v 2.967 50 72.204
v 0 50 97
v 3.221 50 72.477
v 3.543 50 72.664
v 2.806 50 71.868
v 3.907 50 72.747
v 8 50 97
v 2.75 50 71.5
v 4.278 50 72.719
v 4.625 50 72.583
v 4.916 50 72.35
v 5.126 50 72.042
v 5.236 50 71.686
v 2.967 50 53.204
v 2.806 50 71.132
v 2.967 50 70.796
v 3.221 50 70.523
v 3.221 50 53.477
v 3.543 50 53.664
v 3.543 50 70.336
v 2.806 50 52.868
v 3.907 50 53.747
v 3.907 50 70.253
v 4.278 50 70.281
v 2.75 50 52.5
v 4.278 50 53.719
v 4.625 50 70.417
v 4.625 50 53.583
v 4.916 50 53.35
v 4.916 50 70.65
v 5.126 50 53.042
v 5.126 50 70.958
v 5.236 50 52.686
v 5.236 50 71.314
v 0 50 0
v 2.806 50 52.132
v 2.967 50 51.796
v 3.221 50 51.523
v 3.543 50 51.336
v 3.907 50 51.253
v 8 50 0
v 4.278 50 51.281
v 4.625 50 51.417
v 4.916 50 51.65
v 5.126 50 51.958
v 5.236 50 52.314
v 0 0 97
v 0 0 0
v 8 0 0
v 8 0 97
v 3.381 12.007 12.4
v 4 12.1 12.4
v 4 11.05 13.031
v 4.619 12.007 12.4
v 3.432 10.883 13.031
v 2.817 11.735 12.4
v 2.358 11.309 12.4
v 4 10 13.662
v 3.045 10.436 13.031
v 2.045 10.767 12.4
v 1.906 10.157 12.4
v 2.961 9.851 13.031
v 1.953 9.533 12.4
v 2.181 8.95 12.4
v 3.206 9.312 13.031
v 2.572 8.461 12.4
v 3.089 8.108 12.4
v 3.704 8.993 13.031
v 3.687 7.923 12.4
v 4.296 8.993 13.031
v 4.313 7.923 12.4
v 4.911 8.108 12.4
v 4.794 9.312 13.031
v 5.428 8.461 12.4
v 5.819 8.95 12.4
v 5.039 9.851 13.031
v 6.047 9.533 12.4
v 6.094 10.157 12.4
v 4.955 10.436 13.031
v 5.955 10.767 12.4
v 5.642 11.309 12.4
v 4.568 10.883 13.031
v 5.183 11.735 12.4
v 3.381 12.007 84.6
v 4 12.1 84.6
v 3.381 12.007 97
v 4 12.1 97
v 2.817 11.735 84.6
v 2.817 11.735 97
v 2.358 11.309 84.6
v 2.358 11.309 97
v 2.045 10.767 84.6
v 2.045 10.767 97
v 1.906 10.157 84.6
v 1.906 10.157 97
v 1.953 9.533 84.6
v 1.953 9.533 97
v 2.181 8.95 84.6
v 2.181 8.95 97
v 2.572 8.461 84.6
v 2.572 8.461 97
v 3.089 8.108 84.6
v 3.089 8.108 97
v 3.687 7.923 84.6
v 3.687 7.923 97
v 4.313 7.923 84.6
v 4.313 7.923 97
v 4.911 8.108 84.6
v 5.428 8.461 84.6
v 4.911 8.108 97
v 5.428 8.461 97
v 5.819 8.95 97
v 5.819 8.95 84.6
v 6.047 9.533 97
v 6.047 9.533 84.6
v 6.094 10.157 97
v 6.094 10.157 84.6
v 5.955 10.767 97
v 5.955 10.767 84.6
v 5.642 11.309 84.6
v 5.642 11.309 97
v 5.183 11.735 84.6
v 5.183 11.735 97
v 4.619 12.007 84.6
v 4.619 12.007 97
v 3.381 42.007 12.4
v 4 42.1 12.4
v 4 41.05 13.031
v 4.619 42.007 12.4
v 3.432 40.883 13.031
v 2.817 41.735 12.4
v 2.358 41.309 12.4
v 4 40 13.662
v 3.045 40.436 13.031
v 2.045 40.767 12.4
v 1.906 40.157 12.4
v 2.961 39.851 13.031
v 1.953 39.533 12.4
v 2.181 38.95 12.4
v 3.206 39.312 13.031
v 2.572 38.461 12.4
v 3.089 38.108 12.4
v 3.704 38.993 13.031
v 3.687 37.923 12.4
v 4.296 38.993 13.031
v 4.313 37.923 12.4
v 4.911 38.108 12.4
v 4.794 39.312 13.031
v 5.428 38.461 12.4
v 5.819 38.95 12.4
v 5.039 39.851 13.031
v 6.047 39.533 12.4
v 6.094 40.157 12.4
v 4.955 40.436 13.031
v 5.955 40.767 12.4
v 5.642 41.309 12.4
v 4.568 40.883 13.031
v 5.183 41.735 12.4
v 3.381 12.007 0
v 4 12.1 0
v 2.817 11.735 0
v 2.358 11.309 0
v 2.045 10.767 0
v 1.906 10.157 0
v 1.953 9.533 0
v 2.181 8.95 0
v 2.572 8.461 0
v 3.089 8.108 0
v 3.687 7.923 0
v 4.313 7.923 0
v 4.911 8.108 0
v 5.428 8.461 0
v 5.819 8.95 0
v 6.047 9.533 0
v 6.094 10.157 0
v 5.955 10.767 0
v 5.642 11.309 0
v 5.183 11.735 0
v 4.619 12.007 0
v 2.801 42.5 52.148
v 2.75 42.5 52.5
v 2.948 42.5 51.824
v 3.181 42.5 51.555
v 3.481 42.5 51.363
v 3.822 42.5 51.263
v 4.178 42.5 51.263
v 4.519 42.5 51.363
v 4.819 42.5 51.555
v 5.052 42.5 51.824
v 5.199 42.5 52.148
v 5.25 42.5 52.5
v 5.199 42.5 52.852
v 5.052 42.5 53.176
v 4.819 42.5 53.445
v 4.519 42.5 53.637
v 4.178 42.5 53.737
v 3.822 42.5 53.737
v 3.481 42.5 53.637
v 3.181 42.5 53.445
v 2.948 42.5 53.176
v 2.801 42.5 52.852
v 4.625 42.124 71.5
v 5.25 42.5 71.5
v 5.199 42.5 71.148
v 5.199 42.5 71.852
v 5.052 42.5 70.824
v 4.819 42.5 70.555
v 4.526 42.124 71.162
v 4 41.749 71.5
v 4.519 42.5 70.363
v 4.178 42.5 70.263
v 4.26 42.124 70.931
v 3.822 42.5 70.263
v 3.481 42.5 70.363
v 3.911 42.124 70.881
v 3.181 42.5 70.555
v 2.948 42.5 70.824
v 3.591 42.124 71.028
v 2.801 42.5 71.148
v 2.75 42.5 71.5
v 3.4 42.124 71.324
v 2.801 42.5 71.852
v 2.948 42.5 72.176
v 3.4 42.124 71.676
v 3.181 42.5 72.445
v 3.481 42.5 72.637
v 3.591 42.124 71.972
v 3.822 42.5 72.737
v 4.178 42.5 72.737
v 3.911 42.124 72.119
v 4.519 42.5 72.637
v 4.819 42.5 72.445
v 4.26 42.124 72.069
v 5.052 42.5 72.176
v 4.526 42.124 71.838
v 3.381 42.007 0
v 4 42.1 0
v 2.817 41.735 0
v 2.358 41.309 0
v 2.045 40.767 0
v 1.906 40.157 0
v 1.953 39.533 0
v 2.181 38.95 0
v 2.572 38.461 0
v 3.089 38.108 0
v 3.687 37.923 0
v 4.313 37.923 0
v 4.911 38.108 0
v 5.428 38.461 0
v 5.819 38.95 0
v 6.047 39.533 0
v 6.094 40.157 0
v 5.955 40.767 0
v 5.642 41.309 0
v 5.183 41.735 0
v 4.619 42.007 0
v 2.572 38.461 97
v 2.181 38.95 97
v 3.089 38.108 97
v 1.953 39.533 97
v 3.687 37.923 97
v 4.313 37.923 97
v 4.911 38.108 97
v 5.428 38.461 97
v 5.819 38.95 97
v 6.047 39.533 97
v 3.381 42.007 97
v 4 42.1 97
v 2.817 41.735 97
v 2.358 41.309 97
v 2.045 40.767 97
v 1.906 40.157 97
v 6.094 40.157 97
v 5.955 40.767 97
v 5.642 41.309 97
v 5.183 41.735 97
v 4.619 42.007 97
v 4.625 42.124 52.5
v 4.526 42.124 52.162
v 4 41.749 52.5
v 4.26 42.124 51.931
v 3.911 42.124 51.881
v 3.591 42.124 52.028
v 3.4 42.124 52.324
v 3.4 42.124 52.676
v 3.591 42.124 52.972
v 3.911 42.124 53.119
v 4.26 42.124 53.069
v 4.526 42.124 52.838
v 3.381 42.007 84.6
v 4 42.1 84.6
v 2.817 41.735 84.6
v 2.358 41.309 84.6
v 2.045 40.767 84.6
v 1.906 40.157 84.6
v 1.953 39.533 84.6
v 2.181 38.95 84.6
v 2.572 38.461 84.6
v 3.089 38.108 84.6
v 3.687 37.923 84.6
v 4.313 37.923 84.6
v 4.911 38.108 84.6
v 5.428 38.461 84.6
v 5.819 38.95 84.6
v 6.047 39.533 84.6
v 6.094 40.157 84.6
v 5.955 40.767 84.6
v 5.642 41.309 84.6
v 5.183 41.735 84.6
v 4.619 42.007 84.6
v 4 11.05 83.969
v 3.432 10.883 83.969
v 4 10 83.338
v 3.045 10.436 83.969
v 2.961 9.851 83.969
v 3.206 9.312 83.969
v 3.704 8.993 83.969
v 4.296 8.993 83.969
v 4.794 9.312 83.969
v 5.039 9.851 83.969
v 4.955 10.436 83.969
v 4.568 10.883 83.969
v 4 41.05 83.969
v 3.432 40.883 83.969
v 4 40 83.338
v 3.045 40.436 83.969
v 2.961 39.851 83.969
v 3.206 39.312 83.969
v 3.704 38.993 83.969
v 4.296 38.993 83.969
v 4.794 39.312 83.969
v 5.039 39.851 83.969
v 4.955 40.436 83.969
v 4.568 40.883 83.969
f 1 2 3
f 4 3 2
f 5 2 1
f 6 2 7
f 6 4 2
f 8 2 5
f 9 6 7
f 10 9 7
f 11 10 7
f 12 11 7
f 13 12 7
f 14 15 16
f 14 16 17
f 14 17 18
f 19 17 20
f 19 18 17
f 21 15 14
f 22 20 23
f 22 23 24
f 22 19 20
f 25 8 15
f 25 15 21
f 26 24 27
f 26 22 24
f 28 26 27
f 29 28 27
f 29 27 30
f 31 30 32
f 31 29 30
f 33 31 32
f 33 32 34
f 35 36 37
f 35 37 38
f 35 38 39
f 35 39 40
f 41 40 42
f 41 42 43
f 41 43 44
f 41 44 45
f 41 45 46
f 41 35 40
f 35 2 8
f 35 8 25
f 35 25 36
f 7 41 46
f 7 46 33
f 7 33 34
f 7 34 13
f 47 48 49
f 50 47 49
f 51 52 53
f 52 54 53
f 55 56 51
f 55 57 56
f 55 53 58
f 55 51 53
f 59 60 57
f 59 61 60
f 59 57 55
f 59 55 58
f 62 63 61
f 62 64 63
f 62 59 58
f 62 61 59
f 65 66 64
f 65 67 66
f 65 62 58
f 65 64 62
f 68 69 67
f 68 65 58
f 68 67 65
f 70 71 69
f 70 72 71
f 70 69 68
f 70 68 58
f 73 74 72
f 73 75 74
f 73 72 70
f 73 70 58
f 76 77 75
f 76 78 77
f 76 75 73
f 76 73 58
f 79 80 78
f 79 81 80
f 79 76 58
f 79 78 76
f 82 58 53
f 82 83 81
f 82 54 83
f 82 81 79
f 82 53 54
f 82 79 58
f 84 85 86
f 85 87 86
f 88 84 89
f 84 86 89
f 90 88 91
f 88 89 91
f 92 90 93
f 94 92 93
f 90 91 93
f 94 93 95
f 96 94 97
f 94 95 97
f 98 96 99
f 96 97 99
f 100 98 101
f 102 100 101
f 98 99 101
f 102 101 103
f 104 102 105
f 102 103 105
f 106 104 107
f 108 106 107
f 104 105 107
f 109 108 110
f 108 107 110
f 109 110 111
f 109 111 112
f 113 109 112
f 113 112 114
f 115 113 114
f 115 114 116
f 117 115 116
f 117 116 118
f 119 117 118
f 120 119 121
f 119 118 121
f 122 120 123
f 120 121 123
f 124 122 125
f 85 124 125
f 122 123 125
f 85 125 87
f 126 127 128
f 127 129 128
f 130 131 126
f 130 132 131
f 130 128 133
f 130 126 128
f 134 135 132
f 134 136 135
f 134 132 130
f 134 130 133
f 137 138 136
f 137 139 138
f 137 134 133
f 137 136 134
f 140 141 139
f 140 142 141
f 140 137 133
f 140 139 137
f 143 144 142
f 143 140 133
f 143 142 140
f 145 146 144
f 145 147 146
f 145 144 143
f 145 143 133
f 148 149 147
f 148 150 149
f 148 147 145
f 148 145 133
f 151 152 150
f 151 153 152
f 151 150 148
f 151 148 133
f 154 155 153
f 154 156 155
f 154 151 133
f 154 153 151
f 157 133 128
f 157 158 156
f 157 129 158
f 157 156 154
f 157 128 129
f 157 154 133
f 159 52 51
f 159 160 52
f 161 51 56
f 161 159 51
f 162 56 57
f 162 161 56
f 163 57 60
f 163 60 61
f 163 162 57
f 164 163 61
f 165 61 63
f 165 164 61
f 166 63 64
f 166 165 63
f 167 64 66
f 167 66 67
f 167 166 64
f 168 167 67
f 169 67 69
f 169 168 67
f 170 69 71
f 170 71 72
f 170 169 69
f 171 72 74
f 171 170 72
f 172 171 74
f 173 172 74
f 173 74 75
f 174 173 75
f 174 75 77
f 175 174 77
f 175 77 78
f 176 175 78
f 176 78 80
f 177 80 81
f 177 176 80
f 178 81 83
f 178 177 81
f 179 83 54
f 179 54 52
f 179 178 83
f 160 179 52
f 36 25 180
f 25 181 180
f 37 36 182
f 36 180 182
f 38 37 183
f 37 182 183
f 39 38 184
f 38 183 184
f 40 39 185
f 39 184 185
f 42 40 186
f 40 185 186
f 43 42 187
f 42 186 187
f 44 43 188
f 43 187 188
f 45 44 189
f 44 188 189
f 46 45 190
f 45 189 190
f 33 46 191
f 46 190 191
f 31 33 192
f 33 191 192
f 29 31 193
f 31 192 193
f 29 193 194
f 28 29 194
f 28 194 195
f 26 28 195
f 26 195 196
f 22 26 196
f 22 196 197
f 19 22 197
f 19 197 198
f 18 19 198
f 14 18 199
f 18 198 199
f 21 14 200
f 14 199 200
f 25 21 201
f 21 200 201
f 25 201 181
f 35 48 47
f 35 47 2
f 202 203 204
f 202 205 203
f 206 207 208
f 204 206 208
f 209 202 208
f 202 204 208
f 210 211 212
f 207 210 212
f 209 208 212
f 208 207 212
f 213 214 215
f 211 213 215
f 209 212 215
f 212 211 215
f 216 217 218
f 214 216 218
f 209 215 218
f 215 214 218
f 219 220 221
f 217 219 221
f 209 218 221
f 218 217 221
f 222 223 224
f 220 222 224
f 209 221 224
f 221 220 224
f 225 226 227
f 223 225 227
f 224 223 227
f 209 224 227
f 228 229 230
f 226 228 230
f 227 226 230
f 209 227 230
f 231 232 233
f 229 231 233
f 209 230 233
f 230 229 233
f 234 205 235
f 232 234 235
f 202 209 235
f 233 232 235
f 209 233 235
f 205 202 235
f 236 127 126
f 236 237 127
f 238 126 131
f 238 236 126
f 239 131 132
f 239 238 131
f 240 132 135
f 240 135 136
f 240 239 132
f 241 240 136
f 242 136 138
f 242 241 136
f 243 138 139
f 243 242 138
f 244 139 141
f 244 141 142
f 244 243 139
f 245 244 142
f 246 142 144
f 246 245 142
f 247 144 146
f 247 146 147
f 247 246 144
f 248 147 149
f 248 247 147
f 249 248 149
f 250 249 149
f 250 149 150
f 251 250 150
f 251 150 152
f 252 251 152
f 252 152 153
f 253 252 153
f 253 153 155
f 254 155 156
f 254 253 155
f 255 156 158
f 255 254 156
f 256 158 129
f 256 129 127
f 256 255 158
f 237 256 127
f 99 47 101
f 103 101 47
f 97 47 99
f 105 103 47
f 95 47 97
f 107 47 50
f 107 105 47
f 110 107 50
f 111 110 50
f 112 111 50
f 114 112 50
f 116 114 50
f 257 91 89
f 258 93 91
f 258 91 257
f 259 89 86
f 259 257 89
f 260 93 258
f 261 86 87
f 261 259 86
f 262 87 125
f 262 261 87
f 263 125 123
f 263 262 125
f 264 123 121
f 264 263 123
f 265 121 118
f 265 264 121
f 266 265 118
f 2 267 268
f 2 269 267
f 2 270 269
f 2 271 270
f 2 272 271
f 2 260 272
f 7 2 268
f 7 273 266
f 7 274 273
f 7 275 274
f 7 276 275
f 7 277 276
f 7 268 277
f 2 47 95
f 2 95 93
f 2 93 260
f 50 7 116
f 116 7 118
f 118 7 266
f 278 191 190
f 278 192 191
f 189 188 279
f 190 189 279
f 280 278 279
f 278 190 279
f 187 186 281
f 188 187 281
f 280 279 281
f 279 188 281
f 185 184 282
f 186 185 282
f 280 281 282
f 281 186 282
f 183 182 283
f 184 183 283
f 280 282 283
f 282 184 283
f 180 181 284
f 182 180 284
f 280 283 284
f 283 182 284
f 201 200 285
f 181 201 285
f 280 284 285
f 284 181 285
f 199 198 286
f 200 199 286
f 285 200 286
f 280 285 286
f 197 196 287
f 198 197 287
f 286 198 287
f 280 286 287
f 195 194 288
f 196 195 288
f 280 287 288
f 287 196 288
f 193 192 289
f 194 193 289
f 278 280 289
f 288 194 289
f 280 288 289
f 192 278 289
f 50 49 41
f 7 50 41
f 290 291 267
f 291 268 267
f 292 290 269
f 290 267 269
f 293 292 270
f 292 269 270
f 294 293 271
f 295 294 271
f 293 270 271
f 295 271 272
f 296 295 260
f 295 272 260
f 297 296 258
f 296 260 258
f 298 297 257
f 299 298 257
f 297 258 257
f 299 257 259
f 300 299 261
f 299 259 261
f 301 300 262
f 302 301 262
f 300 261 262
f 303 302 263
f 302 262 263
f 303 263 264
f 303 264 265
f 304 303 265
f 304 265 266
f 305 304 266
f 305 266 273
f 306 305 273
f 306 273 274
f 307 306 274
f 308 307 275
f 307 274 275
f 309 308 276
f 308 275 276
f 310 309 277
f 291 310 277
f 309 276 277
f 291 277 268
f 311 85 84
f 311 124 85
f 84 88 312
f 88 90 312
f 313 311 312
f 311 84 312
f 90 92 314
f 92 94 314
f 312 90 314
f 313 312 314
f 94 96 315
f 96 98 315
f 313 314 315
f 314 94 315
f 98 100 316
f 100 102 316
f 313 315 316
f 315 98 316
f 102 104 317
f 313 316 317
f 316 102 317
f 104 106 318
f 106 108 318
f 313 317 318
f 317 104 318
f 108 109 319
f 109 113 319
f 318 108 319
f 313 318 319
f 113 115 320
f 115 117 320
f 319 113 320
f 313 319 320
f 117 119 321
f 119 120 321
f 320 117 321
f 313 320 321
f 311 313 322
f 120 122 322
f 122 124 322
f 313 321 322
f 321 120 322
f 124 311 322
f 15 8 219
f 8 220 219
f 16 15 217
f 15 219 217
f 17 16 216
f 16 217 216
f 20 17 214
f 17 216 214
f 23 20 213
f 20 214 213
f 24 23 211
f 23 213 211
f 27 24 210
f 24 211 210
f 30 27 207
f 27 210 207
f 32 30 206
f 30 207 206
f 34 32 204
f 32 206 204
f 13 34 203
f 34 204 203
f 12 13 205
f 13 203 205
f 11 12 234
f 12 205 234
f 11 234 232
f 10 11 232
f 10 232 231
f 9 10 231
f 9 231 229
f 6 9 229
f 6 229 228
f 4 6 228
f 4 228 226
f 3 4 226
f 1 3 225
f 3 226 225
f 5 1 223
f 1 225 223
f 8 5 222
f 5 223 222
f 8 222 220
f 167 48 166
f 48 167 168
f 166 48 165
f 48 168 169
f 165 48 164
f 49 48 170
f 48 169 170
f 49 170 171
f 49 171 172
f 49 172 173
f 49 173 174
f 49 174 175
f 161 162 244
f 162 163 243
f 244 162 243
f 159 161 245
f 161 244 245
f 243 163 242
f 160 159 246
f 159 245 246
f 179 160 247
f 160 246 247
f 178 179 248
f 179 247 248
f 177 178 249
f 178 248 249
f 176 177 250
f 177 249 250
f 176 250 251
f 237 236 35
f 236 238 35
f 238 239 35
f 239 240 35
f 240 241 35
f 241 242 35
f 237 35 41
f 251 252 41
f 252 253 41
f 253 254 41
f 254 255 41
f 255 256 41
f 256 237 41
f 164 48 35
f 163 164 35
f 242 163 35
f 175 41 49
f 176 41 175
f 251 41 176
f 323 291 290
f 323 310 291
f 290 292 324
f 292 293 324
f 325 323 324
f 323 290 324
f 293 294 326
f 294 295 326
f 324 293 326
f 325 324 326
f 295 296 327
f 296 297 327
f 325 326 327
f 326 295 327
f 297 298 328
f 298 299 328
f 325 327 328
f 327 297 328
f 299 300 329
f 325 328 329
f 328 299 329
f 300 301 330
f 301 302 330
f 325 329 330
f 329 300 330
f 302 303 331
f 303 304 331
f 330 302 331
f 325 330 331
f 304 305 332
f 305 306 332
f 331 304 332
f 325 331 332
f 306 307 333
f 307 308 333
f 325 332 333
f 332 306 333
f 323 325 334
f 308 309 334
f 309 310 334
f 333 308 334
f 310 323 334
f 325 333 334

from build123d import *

# Parameters (mm, degrees)
SKETCH_1_W                  = 8
SKETCH_1_H                  = 50
EXTRUDE_1_DEPTH             = 97
HOLE_WIZARD_M5_2_AT_2_COUNT = 2
HOLE_WIZARD_M5_2_AT_2_PITCH = 30
HOLE_WIZARD_M3_1_D          = 2.5
HOLE_WIZARD_M3_1_DEPTH      = 7.5
HOLE_WIZARD_M3_1_TIP        = 0.751075774


with BuildPart() as part:
    # 草图1 → 凸台-拉伸1 (new body)
    with BuildSketch(Plane.XY):
        with Locations((4, 25)):
            Rectangle(SKETCH_1_W, SKETCH_1_H)
    extrude(amount=EXTRUDE_1_DEPTH)

    # 草图6 → M5 螺纹孔2 (revolve, cut)
    with BuildSketch(Plane(origin=(4, 40, 0), x_dir=(0, 1, 0), z_dir=(1, 0, 0))):
        Polygon((0, 0), (0, 13.6618073), (2.1, 12.4), (2.1, 0), align=None)
    hole_wizard_m5_2 = revolve(axis=Axis((4, 40, -6.35), (0, 0, 1)), mode=Mode.SUBTRACT)

    # M5 螺纹孔2 at 2: M5 螺纹孔2 ×2
    with Locations(*[(0, -i * HOLE_WIZARD_M5_2_AT_2_PITCH, 0) for i in range(1, HOLE_WIZARD_M5_2_AT_2_COUNT)]):
        add(hole_wizard_m5_2, mode=Mode.SUBTRACT)

    # 镜向1: M5 螺纹孔2 across plane
    add(hole_wizard_m5_2.mirror(Plane(origin=(0, 0, 48.5), x_dir=(1, 0, 0), z_dir=(0, 0, -1))), mode=Mode.SUBTRACT)

    # 镜向1 copy 1 sketch → 镜向1 copy 1 (revolve, cut)
    with BuildSketch(Plane(origin=(4, 10, 97), x_dir=(0, 1, 0), z_dir=(1, 0, 0))):
        Polygon((0, 0), (0, -13.6618073), (2.1, -12.4), (2.1, 0), align=None)
    revolve(axis=Axis((4, 10, 103.35), (0, 0, 1)), mode=Mode.SUBTRACT)

    # M3 螺纹孔1
    with Locations(Plane(origin=(0, 50, 0), x_dir=(1, 0, 0), z_dir=(0, 1, 0))):
        with Locations((4, -71.5), (4, -52.5)):
            Hole(HOLE_WIZARD_M3_1_D / 2, depth=HOLE_WIZARD_M3_1_DEPTH)
            with Locations((0, 0, -(HOLE_WIZARD_M3_1_DEPTH + HOLE_WIZARD_M3_1_TIP / 2))):  # 118° drill point
                Cone(0, HOLE_WIZARD_M3_1_D / 2, HOLE_WIZARD_M3_1_TIP, mode=Mode.SUBTRACT)


solid = part.part
